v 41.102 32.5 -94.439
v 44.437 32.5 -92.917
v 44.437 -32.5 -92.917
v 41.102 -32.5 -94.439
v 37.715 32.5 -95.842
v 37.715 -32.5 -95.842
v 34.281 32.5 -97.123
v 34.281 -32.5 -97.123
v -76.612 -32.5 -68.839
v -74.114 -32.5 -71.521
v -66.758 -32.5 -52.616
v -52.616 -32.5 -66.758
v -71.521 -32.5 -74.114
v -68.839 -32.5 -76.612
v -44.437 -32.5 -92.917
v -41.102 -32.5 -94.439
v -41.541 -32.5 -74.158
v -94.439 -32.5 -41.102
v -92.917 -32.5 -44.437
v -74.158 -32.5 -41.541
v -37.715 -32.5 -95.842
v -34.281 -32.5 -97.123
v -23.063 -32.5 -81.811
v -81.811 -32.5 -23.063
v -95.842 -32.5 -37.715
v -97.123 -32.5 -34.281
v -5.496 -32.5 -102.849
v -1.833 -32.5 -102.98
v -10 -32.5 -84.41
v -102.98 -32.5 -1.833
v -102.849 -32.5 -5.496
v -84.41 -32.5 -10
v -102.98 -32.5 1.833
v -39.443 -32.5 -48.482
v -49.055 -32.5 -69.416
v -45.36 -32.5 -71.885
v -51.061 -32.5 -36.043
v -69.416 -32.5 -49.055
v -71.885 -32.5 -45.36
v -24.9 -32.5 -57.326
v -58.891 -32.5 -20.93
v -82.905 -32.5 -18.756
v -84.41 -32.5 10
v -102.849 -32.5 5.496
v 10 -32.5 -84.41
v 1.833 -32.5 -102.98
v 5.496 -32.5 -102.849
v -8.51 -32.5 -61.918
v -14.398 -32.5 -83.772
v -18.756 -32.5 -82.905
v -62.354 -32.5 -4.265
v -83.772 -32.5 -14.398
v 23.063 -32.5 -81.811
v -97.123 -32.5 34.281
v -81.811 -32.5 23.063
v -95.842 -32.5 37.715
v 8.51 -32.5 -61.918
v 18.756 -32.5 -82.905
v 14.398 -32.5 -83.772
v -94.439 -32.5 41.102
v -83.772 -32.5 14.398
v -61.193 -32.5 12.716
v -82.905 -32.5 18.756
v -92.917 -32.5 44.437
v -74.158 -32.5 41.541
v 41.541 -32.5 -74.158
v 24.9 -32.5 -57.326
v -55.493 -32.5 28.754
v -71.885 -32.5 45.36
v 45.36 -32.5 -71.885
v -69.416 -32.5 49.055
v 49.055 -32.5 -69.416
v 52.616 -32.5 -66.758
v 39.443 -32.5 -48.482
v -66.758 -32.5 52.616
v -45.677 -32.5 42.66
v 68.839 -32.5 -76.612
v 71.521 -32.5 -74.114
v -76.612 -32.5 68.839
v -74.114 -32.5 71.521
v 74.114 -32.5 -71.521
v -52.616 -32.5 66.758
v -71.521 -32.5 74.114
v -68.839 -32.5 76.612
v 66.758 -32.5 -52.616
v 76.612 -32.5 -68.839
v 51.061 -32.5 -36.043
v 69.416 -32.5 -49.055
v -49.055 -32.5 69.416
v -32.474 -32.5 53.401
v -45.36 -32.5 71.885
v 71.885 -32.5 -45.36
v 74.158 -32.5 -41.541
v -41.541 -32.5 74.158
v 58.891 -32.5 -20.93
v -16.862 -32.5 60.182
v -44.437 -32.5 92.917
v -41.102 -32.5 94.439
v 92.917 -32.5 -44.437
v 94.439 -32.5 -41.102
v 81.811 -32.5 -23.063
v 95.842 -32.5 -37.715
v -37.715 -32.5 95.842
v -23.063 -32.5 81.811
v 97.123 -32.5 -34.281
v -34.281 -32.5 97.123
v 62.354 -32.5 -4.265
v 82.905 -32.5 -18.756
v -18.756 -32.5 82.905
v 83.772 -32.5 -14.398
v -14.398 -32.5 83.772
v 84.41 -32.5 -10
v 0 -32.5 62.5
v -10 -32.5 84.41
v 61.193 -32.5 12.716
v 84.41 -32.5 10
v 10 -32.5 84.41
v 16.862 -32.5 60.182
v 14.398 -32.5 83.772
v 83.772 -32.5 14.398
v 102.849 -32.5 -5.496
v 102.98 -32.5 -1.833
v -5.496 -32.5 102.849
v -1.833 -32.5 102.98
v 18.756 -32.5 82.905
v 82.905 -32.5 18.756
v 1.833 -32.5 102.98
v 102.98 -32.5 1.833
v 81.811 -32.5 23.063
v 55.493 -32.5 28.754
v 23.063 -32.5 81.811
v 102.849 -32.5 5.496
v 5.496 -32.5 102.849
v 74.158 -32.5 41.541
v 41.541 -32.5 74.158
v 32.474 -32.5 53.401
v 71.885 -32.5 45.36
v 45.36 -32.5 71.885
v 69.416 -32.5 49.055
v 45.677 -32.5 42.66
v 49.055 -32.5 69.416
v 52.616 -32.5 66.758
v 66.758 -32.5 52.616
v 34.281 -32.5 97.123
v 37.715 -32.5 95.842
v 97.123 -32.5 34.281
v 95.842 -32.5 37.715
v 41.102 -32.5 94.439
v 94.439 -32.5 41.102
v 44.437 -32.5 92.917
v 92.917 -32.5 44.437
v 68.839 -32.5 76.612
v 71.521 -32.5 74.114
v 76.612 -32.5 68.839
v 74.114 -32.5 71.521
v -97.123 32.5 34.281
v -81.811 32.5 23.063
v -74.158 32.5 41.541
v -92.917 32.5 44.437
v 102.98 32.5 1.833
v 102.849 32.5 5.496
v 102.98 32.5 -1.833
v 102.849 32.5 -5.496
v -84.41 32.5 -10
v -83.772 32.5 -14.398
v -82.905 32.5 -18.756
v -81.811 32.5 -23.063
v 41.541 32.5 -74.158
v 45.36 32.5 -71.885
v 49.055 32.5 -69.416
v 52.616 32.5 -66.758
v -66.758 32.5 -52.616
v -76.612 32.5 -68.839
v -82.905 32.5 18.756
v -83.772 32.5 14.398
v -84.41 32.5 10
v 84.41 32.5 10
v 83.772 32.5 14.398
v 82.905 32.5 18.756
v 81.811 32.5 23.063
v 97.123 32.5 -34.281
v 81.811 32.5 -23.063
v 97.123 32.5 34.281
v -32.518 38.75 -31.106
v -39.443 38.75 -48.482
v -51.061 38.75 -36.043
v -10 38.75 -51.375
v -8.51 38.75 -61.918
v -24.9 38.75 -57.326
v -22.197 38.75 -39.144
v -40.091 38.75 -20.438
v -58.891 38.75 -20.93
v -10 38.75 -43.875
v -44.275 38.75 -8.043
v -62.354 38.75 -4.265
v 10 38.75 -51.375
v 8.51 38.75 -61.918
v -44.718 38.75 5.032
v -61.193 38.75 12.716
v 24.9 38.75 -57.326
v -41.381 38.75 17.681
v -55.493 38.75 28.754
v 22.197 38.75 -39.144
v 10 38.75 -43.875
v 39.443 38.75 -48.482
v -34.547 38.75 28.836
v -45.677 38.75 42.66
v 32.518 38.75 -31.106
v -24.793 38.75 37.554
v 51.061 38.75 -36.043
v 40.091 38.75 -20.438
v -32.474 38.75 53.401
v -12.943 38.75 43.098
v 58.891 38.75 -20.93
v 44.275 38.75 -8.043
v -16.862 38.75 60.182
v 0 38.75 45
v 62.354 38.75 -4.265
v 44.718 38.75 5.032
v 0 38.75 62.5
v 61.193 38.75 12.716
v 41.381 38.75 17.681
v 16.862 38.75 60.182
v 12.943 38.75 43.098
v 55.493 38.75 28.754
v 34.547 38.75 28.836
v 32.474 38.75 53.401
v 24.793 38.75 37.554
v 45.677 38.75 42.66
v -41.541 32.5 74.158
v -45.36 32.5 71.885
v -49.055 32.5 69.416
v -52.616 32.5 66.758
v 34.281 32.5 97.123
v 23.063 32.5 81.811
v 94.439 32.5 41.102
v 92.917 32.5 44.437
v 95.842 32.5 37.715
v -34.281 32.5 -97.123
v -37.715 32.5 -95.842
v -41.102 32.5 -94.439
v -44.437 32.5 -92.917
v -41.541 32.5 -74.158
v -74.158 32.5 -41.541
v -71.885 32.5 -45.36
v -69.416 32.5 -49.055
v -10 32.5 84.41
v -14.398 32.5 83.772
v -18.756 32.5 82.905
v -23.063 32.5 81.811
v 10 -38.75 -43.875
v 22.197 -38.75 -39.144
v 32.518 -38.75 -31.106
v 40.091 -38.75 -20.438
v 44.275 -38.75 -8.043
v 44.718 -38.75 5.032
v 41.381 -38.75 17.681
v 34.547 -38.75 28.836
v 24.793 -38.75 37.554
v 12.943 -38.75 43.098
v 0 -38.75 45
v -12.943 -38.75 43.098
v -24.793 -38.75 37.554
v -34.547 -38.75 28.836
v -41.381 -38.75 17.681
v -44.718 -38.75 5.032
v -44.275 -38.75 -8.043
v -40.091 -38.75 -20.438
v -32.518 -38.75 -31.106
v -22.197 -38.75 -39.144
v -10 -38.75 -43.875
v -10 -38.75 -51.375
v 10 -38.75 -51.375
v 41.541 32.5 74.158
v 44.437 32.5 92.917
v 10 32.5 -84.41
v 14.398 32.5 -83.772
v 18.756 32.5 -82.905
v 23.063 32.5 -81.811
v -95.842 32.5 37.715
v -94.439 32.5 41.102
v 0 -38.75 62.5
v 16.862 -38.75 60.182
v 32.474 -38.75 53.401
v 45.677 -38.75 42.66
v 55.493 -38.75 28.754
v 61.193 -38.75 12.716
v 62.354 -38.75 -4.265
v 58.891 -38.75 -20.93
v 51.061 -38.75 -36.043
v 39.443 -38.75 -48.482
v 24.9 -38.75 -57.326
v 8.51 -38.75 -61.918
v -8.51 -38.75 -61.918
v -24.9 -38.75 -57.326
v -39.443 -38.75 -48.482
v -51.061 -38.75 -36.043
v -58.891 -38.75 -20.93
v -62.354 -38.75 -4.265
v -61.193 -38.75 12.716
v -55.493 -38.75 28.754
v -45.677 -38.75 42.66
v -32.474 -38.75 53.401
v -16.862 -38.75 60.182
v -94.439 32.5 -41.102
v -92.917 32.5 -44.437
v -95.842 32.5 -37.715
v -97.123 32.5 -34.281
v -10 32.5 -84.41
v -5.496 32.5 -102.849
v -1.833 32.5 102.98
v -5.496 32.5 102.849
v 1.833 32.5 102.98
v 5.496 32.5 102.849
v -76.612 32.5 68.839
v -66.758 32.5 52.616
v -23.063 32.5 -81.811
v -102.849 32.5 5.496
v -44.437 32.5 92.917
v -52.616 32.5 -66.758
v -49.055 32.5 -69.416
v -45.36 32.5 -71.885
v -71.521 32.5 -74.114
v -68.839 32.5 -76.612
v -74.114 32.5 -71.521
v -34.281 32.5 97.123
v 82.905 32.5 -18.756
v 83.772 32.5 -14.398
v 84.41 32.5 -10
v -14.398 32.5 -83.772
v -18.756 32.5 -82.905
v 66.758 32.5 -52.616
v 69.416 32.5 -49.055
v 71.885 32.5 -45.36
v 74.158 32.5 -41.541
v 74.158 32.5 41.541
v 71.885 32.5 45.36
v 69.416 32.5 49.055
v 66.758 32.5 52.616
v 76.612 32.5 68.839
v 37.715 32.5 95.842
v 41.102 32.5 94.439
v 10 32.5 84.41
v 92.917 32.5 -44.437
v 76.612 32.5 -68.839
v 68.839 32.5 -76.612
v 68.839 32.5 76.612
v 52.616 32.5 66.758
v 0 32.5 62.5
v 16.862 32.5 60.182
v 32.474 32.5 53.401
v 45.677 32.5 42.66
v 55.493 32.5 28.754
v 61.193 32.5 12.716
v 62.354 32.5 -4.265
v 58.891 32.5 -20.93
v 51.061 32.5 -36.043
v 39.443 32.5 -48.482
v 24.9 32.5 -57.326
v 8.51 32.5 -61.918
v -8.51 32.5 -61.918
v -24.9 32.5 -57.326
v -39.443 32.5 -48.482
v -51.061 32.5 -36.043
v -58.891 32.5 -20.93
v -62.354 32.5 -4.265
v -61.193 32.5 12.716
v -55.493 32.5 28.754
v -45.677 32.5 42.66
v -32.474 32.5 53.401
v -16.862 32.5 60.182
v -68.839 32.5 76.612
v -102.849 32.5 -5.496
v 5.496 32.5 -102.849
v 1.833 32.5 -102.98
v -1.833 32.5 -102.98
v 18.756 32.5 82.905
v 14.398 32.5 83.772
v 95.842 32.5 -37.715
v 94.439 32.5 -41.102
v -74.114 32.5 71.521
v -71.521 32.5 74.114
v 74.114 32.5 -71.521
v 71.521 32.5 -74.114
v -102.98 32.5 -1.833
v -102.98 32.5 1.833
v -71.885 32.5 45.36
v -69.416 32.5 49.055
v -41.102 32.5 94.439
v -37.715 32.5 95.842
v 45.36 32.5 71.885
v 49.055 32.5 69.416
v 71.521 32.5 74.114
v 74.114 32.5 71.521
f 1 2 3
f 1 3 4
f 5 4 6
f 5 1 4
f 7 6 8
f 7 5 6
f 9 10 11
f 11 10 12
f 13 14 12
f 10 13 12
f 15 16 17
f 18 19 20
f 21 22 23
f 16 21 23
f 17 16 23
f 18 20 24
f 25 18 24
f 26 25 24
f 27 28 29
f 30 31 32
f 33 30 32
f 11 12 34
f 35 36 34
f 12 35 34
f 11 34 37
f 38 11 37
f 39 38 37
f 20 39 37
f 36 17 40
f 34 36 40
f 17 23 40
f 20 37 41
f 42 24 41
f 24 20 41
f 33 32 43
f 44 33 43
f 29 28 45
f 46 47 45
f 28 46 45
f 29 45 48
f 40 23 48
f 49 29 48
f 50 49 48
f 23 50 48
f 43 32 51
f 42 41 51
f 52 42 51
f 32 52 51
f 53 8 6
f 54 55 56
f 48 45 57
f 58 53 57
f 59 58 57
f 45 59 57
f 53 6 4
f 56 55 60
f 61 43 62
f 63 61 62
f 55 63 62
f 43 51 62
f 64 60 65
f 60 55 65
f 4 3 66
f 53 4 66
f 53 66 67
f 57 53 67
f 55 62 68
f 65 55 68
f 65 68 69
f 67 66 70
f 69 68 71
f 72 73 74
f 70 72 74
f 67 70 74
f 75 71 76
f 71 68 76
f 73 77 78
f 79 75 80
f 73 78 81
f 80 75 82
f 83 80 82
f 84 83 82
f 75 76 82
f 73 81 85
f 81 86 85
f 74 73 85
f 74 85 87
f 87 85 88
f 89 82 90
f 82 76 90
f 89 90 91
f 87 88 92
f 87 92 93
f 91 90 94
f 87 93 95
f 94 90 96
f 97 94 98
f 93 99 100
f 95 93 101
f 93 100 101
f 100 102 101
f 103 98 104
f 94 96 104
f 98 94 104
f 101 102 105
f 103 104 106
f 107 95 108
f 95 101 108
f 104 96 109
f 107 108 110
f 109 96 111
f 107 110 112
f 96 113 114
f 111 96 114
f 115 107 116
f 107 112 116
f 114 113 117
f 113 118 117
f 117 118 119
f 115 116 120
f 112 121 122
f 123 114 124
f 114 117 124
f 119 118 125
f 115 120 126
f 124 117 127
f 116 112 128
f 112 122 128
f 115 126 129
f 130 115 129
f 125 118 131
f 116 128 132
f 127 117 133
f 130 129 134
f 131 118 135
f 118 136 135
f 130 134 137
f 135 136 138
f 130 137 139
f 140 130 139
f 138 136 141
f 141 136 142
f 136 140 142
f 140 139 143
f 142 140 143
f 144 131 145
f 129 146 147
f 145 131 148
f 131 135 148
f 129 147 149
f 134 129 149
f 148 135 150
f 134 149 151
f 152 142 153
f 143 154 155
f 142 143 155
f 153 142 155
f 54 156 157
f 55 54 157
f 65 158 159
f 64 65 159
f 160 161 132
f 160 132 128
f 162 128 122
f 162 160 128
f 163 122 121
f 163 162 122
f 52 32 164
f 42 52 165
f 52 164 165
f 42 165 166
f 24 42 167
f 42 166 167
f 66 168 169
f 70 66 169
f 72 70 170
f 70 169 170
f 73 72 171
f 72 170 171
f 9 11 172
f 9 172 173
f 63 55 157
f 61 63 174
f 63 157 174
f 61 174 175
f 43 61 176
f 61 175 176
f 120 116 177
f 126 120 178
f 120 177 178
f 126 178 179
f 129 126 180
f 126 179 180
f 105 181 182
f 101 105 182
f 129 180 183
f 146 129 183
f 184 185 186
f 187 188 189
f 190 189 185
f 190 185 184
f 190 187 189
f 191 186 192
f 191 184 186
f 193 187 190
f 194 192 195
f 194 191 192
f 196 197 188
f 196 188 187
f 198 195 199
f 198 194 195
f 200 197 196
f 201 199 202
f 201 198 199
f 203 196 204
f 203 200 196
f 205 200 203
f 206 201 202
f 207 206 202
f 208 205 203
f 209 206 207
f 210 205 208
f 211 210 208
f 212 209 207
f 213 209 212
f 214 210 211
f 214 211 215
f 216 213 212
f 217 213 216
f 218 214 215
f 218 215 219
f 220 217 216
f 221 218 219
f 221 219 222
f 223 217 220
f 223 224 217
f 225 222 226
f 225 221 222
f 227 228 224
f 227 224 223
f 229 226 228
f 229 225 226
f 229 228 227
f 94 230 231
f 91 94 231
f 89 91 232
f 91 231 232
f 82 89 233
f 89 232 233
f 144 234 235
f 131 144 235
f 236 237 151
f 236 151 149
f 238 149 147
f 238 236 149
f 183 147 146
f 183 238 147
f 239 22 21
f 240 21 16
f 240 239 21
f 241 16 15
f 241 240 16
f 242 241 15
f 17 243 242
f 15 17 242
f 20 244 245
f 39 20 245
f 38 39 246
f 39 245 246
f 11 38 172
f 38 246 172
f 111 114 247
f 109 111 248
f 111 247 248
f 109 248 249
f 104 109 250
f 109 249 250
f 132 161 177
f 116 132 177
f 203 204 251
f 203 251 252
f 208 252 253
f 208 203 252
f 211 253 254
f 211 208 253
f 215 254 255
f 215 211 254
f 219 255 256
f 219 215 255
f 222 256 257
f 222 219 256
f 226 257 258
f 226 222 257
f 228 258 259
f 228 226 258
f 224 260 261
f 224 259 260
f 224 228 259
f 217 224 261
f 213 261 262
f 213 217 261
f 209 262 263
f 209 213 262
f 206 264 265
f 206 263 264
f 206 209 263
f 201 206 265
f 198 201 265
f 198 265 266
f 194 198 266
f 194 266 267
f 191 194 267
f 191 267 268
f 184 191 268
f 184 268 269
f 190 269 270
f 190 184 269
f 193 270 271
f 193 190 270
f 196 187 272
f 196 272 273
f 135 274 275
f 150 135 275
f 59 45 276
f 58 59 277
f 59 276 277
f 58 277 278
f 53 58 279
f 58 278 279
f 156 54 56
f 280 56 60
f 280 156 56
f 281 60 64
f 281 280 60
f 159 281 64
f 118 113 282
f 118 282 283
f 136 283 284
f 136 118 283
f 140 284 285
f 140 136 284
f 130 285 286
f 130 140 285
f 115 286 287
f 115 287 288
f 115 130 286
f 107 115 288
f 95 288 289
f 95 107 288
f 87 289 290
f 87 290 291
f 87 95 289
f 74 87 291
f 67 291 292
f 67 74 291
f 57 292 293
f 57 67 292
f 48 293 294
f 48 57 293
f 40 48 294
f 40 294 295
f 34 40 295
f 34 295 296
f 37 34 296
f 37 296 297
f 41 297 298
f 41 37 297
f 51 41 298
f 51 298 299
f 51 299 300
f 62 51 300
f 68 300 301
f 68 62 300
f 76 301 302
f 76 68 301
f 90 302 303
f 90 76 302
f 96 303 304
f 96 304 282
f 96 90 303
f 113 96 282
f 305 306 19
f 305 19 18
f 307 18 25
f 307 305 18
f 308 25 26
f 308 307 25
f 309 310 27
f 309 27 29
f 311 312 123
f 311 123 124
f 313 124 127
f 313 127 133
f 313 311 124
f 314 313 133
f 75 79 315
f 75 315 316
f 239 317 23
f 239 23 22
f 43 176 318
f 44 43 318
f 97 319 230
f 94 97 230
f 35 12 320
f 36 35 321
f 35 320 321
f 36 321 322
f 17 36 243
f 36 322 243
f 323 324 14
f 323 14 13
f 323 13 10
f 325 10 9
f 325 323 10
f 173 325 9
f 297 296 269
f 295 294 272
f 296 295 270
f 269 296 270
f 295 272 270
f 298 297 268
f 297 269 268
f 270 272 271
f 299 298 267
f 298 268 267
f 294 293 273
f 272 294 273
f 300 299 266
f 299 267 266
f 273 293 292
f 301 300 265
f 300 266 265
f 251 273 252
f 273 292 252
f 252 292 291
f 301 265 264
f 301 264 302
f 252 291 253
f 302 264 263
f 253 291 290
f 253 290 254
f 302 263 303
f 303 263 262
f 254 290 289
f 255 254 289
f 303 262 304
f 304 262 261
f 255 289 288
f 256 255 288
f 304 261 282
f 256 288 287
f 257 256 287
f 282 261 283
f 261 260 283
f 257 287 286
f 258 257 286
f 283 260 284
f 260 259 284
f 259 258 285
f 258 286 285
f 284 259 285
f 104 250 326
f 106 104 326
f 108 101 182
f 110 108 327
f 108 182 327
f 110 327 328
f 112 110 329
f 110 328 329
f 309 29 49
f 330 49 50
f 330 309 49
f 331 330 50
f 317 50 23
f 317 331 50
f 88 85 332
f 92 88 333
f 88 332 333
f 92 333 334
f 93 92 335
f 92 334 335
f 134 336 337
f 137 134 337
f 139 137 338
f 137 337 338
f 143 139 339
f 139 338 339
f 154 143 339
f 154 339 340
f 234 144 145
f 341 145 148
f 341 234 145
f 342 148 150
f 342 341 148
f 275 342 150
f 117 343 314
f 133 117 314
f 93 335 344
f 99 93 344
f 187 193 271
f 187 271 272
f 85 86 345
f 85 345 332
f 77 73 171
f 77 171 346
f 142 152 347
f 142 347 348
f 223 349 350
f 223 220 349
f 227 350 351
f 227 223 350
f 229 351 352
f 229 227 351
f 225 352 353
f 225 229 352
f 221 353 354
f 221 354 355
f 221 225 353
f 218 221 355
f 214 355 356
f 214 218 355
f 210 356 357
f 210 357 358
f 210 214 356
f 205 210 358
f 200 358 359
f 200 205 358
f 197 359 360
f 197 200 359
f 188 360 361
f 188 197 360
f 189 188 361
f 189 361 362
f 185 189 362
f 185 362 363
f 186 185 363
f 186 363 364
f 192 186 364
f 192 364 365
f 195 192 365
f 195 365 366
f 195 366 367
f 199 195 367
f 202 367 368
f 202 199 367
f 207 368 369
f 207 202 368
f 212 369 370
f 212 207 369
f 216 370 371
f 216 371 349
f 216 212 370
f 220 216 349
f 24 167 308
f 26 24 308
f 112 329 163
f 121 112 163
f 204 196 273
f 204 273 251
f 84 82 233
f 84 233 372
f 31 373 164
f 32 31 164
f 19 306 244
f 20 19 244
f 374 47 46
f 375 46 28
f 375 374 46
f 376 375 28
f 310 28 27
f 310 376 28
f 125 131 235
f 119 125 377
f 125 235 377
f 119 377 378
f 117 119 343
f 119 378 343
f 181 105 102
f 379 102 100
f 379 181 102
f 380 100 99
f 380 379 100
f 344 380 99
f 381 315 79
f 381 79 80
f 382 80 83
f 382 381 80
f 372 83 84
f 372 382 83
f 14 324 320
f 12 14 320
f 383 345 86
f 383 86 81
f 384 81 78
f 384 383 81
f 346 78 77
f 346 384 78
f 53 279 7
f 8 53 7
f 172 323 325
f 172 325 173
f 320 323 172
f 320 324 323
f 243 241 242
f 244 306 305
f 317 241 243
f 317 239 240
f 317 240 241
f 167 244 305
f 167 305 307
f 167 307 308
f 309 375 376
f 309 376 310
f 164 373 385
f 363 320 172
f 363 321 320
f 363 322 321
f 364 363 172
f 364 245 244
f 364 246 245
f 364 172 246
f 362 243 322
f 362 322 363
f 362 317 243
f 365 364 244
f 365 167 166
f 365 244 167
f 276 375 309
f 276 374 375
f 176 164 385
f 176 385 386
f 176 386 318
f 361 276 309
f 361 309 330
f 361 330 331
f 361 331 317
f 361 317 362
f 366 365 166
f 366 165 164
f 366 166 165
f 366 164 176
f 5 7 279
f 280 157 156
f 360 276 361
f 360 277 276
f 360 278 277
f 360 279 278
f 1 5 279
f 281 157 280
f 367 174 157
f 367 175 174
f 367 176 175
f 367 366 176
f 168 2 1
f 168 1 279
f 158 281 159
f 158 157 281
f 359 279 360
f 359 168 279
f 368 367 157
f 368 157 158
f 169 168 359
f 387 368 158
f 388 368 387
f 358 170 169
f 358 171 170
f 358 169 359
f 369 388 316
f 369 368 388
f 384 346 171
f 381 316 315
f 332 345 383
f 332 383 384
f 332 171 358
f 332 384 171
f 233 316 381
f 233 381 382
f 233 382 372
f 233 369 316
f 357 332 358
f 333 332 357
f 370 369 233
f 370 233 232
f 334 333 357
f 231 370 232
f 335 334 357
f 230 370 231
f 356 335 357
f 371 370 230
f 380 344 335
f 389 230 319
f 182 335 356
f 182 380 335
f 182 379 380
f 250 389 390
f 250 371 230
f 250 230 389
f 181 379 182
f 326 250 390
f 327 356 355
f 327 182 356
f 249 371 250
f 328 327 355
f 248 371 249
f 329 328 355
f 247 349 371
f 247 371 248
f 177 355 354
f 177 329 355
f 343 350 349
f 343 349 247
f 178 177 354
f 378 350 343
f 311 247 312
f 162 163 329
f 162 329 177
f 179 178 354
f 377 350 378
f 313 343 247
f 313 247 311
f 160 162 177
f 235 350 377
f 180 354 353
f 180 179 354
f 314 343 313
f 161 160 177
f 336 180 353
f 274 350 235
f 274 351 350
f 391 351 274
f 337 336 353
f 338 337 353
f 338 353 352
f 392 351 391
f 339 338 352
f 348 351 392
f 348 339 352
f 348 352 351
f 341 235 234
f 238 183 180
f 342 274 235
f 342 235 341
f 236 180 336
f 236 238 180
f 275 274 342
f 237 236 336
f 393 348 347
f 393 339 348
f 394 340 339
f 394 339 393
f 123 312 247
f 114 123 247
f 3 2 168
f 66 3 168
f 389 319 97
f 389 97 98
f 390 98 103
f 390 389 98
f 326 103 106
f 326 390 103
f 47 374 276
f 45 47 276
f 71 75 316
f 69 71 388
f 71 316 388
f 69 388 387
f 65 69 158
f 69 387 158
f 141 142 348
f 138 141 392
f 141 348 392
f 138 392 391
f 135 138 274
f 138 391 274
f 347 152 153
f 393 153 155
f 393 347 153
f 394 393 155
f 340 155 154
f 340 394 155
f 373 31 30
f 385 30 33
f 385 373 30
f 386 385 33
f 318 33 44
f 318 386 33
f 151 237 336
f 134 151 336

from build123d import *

# Parameters (mm, degrees)
SKETCH1_R           = 105
BOSS_EXTRUDE1_DEPTH = 32.5
SKETCH2_R           = 62.5
BOSS_EXTRUDE2_DEPTH = 38.75
CUT_EXTRUDE1_DEPTH  = 168.5
CUT_EXTRUDE2_DEPTH  = 165.70143442
SKETCH5_R           = 105
SKETCH5_R_2         = 102.995839741
CUT_EXTRUDE3_DEPTH  = 165.70143442


with BuildPart() as part:
    # Sketch1 → Boss-Extrude1 (new, symmetric)
    with BuildSketch(Plane(origin=(0, 0, 0), x_dir=(1, 0, 0), z_dir=(0, 1, 0))):
        with Locations(Location((0, 0, 0), (0, 0, 270))):
            Circle(SKETCH1_R)
    extrude(amount=BOSS_EXTRUDE1_DEPTH, both=True)

    # Sketch2 → Boss-Extrude2 (add, symmetric)
    with BuildSketch(Plane(origin=(0, 0, 0), x_dir=(1, 0, 0), z_dir=(0, 1, 0))):
        with Locations(Location((0, 0, 0), (0, 0, 270))):
            Circle(SKETCH2_R)
    extrude(amount=BOSS_EXTRUDE2_DEPTH, both=True)

    # Sketch3 → Cut-Extrude1 (cut, through all)
    with BuildSketch(Plane(origin=(0, 38.75, 0), x_dir=(1, 0, 0), z_dir=(0, 1, 0))):
        with BuildLine():
            Line((-10, 43.874821937), (-10, 51.374821937))
            Line((-10, 51.374821937), (10, 51.374821937))
            Line((10, 51.374821937), (10, 43.874821937))
            ThreePointArc((10, 43.874821937), (0, -45), (-10, 43.874821937))
        make_face()
    extrude(amount=-CUT_EXTRUDE1_DEPTH, mode=Mode.SUBTRACT)

    # Sketch4 → Cut-Extrude2 (cut, through all)
    with BuildSketch(Plane(origin=(0, 32.5, 0), x_dir=(1, 0, 0), z_dir=(0, 1, 0))):
        with BuildLine():
            Line((-5, 104.880884817), (-10, 84.409715081))
            ThreePointArc((-10, 84.409715081), (-16.582677371, 83.366748834), (-23.063404167, 81.811242432))
            Line((-23.063404167, 81.811242432), (-35.516779329, 98.810719996))
            ThreePointArc((-35.516779329, 98.810719996), (-20.484483812, 102.982454442), (-5, 104.880884817))
        make_face()
        with BuildLine():
            Line((5, 104.880884817), (10, 84.409715081))
            ThreePointArc((10, 84.409715081), (16.582677371, 83.366748834), (23.063404167, 81.811242432))
            Line((23.063404167, 81.811242432), (35.516779329, 98.810719996))
            ThreePointArc((35.516779329, 98.810719996), (20.484483812, 102.982454442), (5, 104.880884817))
        make_face()
        with BuildLine():
            Line((44.755574654, 94.983885672), (41.540994817, 74.157573784))
            ThreePointArc((41.540994817, 74.157573784), (47.223469807, 70.674917046), (52.61561412, 66.757749743))
            Line((52.61561412, 66.757749743), (70.626450965, 77.697518777))
            ThreePointArc((70.626450965, 77.697518777), (58.334874467, 87.304309292), (44.755574654, 94.983885672))
        make_face()
        with BuildLine():
            Line((77.697518777, 70.626450965), (66.757749743, 52.61561412))
            ThreePointArc((66.757749743, 52.61561412), (70.674917046, 47.223469807), (74.157573784, 41.540994817))
            Line((74.157573784, 41.540994817), (94.983885672, 44.755574654))
            ThreePointArc((94.983885672, 44.755574654), (87.304309292, 58.334874467), (77.697518777, 70.626450965))
        make_face()
        with BuildLine():
            Line((98.810719996, 35.516779329), (81.811242432, 23.063404167))
            ThreePointArc((81.811242432, 23.063404167), (83.366748834, 16.582677371), (84.409715081, 10))
            Line((84.409715081, 10), (104.880884817, 5))
            ThreePointArc((104.880884817, 5), (102.982454442, 20.484483812), (98.810719996, 35.516779329))
        make_face()
        with BuildLine():
            Line((104.880884817, -5), (84.409715081, -10))
            ThreePointArc((84.409715081, -10), (83.366748834, -16.582677371), (81.811242432, -23.063404167))
            Line((81.811242432, -23.063404167), (98.810719996, -35.516779329))
            ThreePointArc((98.810719996, -35.516779329), (102.982454442, -20.484483812), (104.880884817, -5))
        make_face()
        with BuildLine():
            Line((94.983885672, -44.755574654), (74.157573784, -41.540994817))
            ThreePointArc((74.157573784, -41.540994817), (70.674917046, -47.223469807), (66.757749743, -52.61561412))
            Line((66.757749743, -52.61561412), (77.697518777, -70.626450965))
            ThreePointArc((77.697518777, -70.626450965), (87.304309292, -58.334874467), (94.983885672, -44.755574654))
        make_face()
        with BuildLine():
            Line((70.626450965, -77.697518777), (52.61561412, -66.757749743))
            ThreePointArc((52.61561412, -66.757749743), (47.223469807, -70.674917046), (41.540994817, -74.157573784))
            Line((41.540994817, -74.157573784), (44.755574654, -94.983885672))
            ThreePointArc((44.755574654, -94.983885672), (58.334874467, -87.304309292), (70.626450965, -77.697518777))
        make_face()
        with BuildLine():
            Line((35.516779329, -98.810719996), (23.063404167, -81.811242432))
            ThreePointArc((23.063404167, -81.811242432), (16.582677371, -83.366748834), (10, -84.409715081))
            Line((10, -84.409715081), (5, -104.880884817))
            ThreePointArc((5, -104.880884817), (20.484483812, -102.982454442), (35.516779329, -98.810719996))
        make_face()
        with BuildLine():
            Line((-5, -104.880884817), (-10, -84.409715081))
            ThreePointArc((-10, -84.409715081), (-16.582677371, -83.366748834), (-23.063404167, -81.811242432))
            Line((-23.063404167, -81.811242432), (-35.516779329, -98.810719996))
            ThreePointArc((-35.516779329, -98.810719996), (-20.484483812, -102.982454442), (-5, -104.880884817))
        make_face()
        with BuildLine():
            Line((-44.755574654, -94.983885672), (-41.540994817, -74.157573784))
            ThreePointArc((-41.540994817, -74.157573784), (-47.223469807, -70.674917046), (-52.61561412, -66.757749743))
            Line((-52.61561412, -66.757749743), (-70.626450965, -77.697518777))
            ThreePointArc((-70.626450965, -77.697518777), (-58.334874467, -87.304309292), (-44.755574654, -94.983885672))
        make_face()
        with BuildLine():
            Line((-77.697518777, -70.626450965), (-66.757749743, -52.61561412))
            ThreePointArc((-66.757749743, -52.61561412), (-70.674917046, -47.223469807), (-74.157573784, -41.540994817))
            Line((-74.157573784, -41.540994817), (-94.983885672, -44.755574654))
            ThreePointArc((-94.983885672, -44.755574654), (-87.304309292, -58.334874467), (-77.697518777, -70.626450965))
        make_face()
        with BuildLine():
            Line((-98.810719996, -35.516779329), (-81.811242432, -23.063404167))
            ThreePointArc((-81.811242432, -23.063404167), (-83.366748834, -16.582677371), (-84.409715081, -10))
            Line((-84.409715081, -10), (-104.880884817, -5))
            ThreePointArc((-104.880884817, -5), (-102.982454442, -20.484483812), (-98.810719996, -35.516779329))
        make_face()
        with BuildLine():
            Line((-104.880884817, 5), (-84.409715081, 10))
            ThreePointArc((-84.409715081, 10), (-83.366748834, 16.582677371), (-81.811242432, 23.063404167))
            Line((-81.811242432, 23.063404167), (-98.810719996, 35.516779329))
            ThreePointArc((-98.810719996, 35.516779329), (-102.982454442, 20.484483812), (-104.880884817, 5))
        make_face()
        with BuildLine():
            Line((-94.983885672, 44.755574654), (-74.157573784, 41.540994817))
            ThreePointArc((-74.157573784, 41.540994817), (-70.674917046, 47.223469807), (-66.757749743, 52.61561412))
            Line((-66.757749743, 52.61561412), (-77.697518777, 70.626450965))
            ThreePointArc((-77.697518777, 70.626450965), (-87.304309292, 58.334874467), (-94.983885672, 44.755574654))
        make_face()
        with BuildLine():
            Line((-70.626450965, 77.697518777), (-52.61561412, 66.757749743))
            ThreePointArc((-52.61561412, 66.757749743), (-47.223469807, 70.674917046), (-41.540994817, 74.157573784))
            Line((-41.540994817, 74.157573784), (-44.755574654, 94.983885672))
            ThreePointArc((-44.755574654, 94.983885672), (-58.334874467, 87.304309292), (-70.626450965, 77.697518777))
        make_face()
    extrude(amount=-CUT_EXTRUDE2_DEPTH, mode=Mode.SUBTRACT)

    # Sketch5 → Cut-Extrude3 (cut, through all)
    with BuildSketch(Plane(origin=(0, 32.5, 0), x_dir=(1, 0, 0), z_dir=(0, 1, 0))):
        Circle(SKETCH5_R)
        Circle(SKETCH5_R_2, mode=Mode.SUBTRACT)
    extrude(amount=-CUT_EXTRUDE3_DEPTH, mode=Mode.SUBTRACT)


solid = part.part
